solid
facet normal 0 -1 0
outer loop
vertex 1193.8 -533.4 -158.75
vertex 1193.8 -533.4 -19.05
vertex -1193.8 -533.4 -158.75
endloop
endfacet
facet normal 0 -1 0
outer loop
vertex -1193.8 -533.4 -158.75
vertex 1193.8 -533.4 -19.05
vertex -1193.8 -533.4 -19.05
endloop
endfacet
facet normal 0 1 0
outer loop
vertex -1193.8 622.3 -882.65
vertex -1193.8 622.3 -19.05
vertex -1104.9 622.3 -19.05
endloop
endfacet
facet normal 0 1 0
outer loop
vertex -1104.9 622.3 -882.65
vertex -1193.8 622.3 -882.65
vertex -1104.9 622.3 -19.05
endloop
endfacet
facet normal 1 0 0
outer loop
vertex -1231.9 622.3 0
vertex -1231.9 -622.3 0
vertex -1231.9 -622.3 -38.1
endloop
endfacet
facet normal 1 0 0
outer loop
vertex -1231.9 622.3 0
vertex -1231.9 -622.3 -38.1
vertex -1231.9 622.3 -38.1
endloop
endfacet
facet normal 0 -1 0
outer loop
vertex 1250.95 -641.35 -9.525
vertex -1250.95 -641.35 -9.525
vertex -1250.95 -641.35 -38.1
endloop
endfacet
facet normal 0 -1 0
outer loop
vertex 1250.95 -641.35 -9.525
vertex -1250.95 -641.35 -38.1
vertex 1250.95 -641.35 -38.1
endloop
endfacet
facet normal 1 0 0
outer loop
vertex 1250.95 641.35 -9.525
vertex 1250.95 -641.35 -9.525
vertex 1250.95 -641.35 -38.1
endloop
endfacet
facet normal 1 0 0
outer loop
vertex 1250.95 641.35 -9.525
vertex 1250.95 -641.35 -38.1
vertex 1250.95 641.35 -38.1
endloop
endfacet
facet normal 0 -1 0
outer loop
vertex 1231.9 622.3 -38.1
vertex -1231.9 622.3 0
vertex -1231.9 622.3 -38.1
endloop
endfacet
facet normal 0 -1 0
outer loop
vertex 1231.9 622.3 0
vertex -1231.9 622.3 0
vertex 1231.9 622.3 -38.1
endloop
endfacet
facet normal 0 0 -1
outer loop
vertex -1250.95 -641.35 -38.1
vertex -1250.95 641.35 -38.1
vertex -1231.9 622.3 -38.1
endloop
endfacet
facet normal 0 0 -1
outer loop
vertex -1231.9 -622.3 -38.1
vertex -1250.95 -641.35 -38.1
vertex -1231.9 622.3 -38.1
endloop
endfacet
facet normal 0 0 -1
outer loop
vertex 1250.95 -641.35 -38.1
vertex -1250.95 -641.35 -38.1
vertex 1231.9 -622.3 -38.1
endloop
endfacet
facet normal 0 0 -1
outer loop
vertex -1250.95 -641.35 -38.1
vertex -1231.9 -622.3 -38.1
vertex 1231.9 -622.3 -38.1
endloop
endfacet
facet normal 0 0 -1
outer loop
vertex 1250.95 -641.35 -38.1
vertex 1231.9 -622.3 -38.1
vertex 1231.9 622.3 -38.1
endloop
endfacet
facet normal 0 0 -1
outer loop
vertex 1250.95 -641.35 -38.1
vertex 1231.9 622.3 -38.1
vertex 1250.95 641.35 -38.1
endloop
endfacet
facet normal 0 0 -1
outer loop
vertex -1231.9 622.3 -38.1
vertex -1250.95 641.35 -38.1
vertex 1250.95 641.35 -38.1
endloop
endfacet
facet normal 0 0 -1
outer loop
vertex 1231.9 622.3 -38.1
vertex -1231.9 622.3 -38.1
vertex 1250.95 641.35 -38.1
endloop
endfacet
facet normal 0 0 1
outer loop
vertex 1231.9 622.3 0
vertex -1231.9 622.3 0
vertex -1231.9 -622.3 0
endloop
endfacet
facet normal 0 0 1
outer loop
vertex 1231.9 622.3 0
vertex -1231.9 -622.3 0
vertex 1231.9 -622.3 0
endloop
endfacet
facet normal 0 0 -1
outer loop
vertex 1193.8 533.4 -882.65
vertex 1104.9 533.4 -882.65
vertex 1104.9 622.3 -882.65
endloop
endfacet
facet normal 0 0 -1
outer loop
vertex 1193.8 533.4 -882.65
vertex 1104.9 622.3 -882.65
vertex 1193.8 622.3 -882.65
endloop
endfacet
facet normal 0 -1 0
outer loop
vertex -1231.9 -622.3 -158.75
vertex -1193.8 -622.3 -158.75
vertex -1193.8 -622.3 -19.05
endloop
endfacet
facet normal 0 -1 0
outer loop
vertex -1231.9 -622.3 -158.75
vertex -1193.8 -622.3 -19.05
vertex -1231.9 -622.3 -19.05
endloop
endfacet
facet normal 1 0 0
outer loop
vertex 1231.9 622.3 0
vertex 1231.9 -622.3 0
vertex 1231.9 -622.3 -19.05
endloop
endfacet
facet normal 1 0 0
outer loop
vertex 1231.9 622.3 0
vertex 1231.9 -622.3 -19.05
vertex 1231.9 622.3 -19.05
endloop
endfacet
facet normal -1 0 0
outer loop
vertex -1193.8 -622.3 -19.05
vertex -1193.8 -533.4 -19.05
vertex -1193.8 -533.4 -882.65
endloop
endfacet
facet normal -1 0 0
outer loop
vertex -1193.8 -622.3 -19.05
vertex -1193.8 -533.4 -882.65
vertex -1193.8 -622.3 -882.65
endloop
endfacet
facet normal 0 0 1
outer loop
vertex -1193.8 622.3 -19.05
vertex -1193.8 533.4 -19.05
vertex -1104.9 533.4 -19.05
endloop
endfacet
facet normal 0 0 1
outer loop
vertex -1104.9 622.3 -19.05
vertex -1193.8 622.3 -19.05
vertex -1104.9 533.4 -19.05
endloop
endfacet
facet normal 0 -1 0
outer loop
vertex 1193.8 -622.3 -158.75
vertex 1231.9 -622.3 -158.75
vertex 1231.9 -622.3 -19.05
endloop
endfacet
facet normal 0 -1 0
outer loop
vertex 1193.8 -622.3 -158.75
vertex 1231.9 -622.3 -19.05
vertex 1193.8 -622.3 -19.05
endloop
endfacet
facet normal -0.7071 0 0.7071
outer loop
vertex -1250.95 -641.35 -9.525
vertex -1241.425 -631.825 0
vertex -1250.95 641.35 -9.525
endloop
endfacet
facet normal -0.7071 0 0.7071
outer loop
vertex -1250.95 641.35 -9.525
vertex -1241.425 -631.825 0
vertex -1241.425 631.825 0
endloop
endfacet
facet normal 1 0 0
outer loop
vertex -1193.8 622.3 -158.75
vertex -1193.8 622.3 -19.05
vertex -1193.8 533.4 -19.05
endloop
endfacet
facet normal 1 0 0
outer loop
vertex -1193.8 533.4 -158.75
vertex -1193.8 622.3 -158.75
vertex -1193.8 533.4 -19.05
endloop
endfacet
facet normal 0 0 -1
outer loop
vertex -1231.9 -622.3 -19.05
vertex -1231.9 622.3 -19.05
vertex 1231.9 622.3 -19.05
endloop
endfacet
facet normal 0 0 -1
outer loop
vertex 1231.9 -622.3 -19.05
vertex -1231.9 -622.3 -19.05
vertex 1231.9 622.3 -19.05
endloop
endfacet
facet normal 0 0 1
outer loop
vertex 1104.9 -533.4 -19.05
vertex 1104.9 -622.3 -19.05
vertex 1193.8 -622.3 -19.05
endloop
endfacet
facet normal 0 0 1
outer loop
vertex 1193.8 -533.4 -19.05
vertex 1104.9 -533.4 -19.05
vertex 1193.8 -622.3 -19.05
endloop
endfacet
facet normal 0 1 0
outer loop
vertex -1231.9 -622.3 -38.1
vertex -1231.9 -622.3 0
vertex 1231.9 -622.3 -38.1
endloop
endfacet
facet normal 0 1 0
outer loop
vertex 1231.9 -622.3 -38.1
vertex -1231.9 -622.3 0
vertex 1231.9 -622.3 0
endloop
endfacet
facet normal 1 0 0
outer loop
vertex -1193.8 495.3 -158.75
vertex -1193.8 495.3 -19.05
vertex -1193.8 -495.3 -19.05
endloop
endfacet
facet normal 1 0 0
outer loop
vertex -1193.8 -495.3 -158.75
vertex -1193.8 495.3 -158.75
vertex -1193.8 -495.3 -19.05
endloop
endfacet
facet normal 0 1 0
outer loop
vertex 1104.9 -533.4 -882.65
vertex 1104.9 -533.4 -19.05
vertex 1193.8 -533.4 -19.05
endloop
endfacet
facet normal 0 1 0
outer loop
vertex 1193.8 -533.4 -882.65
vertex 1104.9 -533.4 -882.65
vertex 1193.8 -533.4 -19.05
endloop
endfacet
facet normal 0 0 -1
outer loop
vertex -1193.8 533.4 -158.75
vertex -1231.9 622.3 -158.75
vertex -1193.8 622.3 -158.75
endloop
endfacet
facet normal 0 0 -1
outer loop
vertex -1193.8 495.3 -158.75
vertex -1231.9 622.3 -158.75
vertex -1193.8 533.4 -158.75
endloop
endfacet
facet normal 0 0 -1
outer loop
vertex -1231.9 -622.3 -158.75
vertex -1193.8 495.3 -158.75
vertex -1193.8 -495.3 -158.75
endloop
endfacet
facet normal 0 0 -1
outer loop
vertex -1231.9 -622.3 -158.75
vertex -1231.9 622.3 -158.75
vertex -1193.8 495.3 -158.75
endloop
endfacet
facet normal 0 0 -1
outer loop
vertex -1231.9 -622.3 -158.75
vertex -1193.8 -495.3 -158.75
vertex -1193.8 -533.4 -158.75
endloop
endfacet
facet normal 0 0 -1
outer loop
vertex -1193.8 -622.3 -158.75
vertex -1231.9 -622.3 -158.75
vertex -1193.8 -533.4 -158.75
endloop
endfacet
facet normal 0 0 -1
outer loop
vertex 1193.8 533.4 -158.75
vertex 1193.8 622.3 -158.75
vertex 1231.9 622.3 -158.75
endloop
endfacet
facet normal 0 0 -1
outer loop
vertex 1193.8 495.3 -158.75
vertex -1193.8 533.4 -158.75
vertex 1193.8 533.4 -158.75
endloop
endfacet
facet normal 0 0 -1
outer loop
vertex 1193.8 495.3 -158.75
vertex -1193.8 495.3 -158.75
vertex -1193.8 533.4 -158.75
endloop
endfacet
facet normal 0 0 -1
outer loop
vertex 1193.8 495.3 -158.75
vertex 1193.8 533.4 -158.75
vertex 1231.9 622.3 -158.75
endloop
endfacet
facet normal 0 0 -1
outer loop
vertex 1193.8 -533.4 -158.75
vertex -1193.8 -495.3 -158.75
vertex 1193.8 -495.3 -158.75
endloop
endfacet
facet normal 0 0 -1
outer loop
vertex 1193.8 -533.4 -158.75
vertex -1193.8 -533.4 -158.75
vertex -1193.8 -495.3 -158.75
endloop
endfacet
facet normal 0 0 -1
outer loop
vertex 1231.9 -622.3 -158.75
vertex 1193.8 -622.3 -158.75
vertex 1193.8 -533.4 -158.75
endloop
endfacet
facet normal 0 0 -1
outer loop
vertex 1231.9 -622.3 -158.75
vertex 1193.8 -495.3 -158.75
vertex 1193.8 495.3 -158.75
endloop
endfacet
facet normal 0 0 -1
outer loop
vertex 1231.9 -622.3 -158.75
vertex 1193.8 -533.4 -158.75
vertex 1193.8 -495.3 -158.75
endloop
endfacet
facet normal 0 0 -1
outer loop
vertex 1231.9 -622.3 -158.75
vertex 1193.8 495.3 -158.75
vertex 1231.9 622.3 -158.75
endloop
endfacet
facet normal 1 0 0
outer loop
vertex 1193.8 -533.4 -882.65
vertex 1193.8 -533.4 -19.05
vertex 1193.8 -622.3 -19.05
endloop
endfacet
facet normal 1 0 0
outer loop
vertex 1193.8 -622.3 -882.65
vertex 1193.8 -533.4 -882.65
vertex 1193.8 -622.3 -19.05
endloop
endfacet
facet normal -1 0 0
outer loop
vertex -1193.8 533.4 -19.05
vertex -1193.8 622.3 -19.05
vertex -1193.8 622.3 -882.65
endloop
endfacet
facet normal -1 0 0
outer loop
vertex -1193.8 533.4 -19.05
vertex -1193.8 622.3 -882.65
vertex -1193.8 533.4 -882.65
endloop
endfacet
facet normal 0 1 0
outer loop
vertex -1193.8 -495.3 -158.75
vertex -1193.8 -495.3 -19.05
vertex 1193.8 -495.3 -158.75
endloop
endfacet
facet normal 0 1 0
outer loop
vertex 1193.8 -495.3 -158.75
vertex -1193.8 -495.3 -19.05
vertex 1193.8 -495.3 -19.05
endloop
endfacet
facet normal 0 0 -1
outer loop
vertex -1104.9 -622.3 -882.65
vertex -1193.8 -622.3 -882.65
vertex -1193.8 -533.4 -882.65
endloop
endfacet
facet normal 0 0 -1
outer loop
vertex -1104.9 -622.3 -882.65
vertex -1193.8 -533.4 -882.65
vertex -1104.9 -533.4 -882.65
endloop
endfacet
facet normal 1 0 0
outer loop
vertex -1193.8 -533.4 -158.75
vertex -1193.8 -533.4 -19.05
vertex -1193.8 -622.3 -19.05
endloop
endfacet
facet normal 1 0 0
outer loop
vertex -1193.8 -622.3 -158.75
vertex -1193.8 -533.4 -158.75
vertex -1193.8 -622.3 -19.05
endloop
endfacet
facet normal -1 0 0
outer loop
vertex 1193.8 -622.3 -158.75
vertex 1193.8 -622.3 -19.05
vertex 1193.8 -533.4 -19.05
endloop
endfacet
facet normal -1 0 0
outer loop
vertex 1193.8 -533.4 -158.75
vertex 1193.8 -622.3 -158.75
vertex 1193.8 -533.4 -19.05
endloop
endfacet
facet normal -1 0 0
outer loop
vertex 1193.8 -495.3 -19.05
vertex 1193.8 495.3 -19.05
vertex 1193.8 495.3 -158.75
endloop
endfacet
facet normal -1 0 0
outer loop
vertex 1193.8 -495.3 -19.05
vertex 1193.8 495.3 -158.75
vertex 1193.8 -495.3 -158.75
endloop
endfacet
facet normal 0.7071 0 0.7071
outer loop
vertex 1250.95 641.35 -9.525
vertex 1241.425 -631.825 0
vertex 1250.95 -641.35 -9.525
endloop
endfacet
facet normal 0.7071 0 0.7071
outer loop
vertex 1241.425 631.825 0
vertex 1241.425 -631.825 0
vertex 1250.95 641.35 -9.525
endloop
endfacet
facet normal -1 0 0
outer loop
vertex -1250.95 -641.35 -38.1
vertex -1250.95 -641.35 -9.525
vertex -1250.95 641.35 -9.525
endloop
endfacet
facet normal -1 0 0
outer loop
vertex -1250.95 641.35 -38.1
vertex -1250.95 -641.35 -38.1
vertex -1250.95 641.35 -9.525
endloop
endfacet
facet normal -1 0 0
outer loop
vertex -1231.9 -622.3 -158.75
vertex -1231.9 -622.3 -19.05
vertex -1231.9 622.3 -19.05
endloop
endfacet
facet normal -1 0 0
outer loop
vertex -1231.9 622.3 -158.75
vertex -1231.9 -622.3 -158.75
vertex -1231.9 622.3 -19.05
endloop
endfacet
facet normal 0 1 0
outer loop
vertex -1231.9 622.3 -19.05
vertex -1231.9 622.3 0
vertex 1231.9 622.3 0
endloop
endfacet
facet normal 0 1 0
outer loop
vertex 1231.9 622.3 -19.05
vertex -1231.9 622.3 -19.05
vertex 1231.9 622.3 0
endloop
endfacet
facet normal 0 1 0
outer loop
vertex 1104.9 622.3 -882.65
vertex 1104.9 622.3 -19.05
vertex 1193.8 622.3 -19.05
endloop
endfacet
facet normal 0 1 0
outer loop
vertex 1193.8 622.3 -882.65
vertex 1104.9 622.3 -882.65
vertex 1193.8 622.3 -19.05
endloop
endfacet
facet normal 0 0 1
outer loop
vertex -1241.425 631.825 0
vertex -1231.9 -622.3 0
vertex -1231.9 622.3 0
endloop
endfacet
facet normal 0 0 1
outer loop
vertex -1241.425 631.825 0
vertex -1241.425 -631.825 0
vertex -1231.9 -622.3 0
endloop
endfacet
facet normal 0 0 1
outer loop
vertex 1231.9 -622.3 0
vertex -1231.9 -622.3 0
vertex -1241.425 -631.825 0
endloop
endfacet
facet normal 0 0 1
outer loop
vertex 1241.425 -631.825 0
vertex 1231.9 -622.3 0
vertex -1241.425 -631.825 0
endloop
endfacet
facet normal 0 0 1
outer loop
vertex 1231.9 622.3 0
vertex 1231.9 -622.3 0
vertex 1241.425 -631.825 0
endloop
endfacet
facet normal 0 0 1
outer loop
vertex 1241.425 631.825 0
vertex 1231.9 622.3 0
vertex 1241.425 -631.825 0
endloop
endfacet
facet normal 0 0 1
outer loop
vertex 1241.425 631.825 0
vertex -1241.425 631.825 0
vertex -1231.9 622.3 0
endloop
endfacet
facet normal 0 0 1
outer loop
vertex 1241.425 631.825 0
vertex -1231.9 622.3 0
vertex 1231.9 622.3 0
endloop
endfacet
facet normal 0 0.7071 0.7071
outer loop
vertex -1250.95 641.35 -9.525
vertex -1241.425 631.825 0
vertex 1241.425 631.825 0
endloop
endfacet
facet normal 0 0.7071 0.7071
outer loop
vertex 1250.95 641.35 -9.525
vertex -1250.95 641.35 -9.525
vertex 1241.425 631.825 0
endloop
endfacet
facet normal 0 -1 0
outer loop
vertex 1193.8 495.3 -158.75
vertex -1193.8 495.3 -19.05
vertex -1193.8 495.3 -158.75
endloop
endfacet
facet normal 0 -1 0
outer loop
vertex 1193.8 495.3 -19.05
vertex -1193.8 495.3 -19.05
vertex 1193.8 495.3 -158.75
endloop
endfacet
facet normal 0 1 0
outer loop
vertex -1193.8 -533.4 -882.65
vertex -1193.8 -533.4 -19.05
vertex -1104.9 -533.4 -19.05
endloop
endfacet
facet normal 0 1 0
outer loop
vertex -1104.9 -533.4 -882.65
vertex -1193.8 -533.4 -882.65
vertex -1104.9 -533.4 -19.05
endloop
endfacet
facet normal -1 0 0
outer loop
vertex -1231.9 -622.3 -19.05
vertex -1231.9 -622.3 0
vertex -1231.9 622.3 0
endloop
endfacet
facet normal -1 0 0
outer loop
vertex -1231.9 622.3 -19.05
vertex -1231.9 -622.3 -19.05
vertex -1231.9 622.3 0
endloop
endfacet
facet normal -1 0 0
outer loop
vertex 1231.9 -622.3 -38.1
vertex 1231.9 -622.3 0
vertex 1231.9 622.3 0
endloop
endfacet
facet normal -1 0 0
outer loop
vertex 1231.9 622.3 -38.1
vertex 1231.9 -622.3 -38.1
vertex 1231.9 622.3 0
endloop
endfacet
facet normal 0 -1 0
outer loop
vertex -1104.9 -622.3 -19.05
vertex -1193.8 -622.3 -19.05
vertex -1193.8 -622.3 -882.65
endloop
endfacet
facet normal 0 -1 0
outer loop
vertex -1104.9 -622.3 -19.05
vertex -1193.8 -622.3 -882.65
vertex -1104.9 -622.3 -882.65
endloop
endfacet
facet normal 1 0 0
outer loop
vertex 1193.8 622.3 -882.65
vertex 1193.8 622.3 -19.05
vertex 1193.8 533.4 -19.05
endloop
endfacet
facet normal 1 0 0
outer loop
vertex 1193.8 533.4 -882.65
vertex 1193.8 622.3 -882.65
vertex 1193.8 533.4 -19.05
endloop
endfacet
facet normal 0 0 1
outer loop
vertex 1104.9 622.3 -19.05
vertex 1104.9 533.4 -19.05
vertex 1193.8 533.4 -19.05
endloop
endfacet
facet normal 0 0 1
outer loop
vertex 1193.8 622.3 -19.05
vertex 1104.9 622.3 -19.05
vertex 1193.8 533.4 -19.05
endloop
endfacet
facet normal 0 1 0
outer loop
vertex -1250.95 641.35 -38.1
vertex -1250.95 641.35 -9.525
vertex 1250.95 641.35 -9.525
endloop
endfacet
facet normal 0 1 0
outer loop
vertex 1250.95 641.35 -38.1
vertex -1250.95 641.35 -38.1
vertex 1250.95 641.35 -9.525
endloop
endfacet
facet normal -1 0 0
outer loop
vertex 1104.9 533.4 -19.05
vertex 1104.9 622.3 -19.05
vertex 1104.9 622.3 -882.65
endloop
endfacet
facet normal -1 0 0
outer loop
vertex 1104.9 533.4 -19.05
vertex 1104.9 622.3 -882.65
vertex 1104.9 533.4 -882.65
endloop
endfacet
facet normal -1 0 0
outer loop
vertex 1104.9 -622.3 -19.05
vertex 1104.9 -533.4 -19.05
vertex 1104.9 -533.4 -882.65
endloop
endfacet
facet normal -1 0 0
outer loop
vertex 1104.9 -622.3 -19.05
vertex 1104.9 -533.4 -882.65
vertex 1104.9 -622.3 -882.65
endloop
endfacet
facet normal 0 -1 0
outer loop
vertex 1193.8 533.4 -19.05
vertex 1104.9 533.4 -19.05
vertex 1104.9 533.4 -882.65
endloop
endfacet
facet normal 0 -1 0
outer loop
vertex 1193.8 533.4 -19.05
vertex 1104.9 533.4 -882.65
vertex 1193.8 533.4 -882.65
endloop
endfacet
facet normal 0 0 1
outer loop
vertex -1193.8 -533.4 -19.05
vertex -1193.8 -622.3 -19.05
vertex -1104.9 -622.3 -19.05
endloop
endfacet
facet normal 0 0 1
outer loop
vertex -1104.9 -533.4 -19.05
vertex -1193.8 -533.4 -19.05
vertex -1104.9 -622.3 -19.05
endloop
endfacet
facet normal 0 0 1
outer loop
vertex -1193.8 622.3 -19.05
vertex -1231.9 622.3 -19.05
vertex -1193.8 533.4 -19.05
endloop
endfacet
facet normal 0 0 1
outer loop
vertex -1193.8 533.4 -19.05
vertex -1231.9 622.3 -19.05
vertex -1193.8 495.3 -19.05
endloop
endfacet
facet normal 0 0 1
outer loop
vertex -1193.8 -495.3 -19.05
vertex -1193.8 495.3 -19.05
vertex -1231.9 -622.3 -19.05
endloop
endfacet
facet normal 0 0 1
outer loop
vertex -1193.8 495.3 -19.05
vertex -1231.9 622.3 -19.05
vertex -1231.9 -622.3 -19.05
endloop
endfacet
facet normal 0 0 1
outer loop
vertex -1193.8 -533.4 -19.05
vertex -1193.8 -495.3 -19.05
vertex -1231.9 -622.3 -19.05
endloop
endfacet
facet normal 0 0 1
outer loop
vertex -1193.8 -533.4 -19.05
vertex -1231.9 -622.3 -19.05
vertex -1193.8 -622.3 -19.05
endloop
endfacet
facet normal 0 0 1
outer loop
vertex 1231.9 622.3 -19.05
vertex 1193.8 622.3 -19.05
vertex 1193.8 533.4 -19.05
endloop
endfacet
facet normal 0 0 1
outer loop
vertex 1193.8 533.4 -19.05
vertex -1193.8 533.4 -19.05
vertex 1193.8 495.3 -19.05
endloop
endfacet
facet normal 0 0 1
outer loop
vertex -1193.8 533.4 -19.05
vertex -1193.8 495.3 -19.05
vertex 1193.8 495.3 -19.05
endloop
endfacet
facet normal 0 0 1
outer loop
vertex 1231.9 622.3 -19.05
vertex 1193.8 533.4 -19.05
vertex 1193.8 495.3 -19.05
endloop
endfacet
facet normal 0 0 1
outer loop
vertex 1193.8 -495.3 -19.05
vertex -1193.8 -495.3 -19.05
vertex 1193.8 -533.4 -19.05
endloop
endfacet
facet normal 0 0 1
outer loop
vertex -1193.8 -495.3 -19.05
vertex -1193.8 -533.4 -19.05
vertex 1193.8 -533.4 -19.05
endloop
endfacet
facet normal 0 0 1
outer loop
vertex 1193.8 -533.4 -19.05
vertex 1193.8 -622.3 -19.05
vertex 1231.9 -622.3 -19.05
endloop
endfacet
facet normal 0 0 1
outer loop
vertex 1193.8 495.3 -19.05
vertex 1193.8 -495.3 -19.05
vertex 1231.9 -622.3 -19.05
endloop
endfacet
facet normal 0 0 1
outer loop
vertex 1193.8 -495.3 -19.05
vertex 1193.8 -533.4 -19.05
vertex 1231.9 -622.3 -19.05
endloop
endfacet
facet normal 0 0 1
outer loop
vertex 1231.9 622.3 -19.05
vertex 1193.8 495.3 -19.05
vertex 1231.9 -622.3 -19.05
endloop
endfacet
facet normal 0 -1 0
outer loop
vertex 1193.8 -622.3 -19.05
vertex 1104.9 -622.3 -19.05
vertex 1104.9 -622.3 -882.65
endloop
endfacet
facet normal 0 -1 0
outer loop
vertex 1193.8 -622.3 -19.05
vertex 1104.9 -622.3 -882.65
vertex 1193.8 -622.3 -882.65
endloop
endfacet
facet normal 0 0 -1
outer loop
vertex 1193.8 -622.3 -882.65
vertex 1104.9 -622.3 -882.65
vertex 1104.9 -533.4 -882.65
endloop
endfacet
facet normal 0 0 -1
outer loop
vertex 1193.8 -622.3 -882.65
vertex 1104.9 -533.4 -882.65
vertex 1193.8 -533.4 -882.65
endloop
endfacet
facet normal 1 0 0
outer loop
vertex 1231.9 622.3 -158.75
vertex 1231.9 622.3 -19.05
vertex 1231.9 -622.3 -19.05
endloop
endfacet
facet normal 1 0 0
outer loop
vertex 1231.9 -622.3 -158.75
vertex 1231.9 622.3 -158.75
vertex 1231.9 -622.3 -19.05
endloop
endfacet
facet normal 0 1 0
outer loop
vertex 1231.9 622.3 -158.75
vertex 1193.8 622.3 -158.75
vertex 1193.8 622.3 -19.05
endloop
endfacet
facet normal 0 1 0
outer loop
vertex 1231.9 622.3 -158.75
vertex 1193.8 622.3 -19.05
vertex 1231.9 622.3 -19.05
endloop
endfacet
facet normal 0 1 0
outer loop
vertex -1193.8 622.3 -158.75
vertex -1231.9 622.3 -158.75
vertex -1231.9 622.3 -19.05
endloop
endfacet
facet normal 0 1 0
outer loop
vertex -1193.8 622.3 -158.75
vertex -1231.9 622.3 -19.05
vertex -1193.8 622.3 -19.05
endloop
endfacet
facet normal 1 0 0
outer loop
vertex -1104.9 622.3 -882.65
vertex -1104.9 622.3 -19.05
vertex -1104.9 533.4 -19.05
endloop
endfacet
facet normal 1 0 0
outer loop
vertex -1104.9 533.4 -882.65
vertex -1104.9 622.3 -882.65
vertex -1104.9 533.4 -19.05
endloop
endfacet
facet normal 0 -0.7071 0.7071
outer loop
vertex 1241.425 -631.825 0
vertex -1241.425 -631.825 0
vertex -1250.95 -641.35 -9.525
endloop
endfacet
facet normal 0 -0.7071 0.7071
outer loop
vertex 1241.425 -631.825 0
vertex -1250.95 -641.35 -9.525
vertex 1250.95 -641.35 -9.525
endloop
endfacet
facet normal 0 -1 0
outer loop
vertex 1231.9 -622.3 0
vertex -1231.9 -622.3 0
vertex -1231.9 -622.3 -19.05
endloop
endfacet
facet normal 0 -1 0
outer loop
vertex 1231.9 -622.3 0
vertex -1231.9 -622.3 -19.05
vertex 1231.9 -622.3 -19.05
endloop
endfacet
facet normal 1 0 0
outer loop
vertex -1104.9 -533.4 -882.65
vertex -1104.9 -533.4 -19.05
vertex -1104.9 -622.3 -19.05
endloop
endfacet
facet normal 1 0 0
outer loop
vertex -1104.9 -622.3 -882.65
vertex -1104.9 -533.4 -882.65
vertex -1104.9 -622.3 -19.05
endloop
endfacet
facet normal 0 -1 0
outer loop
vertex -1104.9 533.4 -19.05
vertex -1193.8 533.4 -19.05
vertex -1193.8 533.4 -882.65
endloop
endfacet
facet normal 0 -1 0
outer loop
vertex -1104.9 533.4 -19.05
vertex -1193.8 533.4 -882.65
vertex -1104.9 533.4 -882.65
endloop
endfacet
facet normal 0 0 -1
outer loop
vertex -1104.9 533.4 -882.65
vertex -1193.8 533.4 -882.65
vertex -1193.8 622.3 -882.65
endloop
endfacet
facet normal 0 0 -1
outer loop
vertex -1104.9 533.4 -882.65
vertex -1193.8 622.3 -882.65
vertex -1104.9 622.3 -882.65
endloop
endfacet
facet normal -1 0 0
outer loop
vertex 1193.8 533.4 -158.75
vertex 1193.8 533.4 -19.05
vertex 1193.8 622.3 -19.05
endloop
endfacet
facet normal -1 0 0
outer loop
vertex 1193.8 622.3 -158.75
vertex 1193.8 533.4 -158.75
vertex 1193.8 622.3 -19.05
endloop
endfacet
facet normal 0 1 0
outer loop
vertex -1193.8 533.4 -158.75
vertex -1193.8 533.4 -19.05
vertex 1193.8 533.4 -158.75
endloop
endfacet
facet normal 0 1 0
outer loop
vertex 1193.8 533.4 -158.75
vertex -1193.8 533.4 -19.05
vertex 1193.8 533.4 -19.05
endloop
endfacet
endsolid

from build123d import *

# Parameters (mm, degrees)
F0_W     = 2463.8
F0_H     = 1244.6
F1_DEPTH = 19.05
F0_W_2   = 2501.9
F0_H_2   = 1282.7
F2_DEPTH = 38.1
F3_SIZE  = 9.525
F4_W     = 2387.6
F4_H     = 990.6
F5_DEPTH = 139.7
F6_W     = 88.9
F6_H     = 88.9
F7_DEPTH = 863.6


with BuildPart() as f1:
    # F0 (on Top) → F1 (new body)
    with BuildSketch(Plane.XY):
        Rectangle(F0_W, F0_H)
    extrude(amount=-F1_DEPTH)


with BuildPart() as f2:
    # F0 (on Top) → F2 (new body)
    with BuildSketch(Plane.XY):
        Rectangle(F0_W_2, F0_H_2)
        Rectangle(F0_W, F0_H, mode=Mode.SUBTRACT)
    extrude(amount=-F2_DEPTH)

    # F3
    f3_edges = [f2.edges().sort_by_distance(p)[0] for p in [
        (0, -641.35, 0),
        (-1250.95, 0, 0),
        (0, 641.35, 0),
        (1250.95, 0, 0),
    ]]
    chamfer(f3_edges, length=F3_SIZE)


with BuildPart() as f5:
    # F4 (on face) → F5 (new body)
    with BuildSketch(Plane(origin=(0, 0, -19.05), x_dir=(1, 0, 0), z_dir=(0, 0, -1))):
        Polygon((-1193.8, 622.3), (-1231.9, 622.3), (-1231.9, -622.3), (-1193.8, -622.3), (-1193.8, -533.4), (1193.8, -533.4), (1193.8, -622.3), (1231.9, -622.3), (1231.9, 622.3), (1193.8, 622.3), (1193.8, 533.4), (-1193.8, 533.4), align=None)
        Rectangle(F4_W, F4_H, mode=Mode.SUBTRACT)
    extrude(amount=F5_DEPTH)


with BuildPart() as f7:
    # F6 (on face) → F7 (new body)
    with BuildSketch(Plane(origin=(0, 0, -19.05), x_dir=(1, 0, 0), z_dir=(0, 0, -1))):
        with Locations((-1149.35, -577.85)):
            Rectangle(F6_W, F6_H)
        with Locations((-1149.35, 577.85)):
            Rectangle(F6_W, F6_H)
        with Locations((1149.35, -577.85)):
            Rectangle(F6_W, F6_H)
        with Locations((1149.35, 577.85)):
            Rectangle(F6_W, F6_H)
    extrude(amount=F7_DEPTH)


solid = Compound([f1.part, f2.part, f5.part, f7.part])
